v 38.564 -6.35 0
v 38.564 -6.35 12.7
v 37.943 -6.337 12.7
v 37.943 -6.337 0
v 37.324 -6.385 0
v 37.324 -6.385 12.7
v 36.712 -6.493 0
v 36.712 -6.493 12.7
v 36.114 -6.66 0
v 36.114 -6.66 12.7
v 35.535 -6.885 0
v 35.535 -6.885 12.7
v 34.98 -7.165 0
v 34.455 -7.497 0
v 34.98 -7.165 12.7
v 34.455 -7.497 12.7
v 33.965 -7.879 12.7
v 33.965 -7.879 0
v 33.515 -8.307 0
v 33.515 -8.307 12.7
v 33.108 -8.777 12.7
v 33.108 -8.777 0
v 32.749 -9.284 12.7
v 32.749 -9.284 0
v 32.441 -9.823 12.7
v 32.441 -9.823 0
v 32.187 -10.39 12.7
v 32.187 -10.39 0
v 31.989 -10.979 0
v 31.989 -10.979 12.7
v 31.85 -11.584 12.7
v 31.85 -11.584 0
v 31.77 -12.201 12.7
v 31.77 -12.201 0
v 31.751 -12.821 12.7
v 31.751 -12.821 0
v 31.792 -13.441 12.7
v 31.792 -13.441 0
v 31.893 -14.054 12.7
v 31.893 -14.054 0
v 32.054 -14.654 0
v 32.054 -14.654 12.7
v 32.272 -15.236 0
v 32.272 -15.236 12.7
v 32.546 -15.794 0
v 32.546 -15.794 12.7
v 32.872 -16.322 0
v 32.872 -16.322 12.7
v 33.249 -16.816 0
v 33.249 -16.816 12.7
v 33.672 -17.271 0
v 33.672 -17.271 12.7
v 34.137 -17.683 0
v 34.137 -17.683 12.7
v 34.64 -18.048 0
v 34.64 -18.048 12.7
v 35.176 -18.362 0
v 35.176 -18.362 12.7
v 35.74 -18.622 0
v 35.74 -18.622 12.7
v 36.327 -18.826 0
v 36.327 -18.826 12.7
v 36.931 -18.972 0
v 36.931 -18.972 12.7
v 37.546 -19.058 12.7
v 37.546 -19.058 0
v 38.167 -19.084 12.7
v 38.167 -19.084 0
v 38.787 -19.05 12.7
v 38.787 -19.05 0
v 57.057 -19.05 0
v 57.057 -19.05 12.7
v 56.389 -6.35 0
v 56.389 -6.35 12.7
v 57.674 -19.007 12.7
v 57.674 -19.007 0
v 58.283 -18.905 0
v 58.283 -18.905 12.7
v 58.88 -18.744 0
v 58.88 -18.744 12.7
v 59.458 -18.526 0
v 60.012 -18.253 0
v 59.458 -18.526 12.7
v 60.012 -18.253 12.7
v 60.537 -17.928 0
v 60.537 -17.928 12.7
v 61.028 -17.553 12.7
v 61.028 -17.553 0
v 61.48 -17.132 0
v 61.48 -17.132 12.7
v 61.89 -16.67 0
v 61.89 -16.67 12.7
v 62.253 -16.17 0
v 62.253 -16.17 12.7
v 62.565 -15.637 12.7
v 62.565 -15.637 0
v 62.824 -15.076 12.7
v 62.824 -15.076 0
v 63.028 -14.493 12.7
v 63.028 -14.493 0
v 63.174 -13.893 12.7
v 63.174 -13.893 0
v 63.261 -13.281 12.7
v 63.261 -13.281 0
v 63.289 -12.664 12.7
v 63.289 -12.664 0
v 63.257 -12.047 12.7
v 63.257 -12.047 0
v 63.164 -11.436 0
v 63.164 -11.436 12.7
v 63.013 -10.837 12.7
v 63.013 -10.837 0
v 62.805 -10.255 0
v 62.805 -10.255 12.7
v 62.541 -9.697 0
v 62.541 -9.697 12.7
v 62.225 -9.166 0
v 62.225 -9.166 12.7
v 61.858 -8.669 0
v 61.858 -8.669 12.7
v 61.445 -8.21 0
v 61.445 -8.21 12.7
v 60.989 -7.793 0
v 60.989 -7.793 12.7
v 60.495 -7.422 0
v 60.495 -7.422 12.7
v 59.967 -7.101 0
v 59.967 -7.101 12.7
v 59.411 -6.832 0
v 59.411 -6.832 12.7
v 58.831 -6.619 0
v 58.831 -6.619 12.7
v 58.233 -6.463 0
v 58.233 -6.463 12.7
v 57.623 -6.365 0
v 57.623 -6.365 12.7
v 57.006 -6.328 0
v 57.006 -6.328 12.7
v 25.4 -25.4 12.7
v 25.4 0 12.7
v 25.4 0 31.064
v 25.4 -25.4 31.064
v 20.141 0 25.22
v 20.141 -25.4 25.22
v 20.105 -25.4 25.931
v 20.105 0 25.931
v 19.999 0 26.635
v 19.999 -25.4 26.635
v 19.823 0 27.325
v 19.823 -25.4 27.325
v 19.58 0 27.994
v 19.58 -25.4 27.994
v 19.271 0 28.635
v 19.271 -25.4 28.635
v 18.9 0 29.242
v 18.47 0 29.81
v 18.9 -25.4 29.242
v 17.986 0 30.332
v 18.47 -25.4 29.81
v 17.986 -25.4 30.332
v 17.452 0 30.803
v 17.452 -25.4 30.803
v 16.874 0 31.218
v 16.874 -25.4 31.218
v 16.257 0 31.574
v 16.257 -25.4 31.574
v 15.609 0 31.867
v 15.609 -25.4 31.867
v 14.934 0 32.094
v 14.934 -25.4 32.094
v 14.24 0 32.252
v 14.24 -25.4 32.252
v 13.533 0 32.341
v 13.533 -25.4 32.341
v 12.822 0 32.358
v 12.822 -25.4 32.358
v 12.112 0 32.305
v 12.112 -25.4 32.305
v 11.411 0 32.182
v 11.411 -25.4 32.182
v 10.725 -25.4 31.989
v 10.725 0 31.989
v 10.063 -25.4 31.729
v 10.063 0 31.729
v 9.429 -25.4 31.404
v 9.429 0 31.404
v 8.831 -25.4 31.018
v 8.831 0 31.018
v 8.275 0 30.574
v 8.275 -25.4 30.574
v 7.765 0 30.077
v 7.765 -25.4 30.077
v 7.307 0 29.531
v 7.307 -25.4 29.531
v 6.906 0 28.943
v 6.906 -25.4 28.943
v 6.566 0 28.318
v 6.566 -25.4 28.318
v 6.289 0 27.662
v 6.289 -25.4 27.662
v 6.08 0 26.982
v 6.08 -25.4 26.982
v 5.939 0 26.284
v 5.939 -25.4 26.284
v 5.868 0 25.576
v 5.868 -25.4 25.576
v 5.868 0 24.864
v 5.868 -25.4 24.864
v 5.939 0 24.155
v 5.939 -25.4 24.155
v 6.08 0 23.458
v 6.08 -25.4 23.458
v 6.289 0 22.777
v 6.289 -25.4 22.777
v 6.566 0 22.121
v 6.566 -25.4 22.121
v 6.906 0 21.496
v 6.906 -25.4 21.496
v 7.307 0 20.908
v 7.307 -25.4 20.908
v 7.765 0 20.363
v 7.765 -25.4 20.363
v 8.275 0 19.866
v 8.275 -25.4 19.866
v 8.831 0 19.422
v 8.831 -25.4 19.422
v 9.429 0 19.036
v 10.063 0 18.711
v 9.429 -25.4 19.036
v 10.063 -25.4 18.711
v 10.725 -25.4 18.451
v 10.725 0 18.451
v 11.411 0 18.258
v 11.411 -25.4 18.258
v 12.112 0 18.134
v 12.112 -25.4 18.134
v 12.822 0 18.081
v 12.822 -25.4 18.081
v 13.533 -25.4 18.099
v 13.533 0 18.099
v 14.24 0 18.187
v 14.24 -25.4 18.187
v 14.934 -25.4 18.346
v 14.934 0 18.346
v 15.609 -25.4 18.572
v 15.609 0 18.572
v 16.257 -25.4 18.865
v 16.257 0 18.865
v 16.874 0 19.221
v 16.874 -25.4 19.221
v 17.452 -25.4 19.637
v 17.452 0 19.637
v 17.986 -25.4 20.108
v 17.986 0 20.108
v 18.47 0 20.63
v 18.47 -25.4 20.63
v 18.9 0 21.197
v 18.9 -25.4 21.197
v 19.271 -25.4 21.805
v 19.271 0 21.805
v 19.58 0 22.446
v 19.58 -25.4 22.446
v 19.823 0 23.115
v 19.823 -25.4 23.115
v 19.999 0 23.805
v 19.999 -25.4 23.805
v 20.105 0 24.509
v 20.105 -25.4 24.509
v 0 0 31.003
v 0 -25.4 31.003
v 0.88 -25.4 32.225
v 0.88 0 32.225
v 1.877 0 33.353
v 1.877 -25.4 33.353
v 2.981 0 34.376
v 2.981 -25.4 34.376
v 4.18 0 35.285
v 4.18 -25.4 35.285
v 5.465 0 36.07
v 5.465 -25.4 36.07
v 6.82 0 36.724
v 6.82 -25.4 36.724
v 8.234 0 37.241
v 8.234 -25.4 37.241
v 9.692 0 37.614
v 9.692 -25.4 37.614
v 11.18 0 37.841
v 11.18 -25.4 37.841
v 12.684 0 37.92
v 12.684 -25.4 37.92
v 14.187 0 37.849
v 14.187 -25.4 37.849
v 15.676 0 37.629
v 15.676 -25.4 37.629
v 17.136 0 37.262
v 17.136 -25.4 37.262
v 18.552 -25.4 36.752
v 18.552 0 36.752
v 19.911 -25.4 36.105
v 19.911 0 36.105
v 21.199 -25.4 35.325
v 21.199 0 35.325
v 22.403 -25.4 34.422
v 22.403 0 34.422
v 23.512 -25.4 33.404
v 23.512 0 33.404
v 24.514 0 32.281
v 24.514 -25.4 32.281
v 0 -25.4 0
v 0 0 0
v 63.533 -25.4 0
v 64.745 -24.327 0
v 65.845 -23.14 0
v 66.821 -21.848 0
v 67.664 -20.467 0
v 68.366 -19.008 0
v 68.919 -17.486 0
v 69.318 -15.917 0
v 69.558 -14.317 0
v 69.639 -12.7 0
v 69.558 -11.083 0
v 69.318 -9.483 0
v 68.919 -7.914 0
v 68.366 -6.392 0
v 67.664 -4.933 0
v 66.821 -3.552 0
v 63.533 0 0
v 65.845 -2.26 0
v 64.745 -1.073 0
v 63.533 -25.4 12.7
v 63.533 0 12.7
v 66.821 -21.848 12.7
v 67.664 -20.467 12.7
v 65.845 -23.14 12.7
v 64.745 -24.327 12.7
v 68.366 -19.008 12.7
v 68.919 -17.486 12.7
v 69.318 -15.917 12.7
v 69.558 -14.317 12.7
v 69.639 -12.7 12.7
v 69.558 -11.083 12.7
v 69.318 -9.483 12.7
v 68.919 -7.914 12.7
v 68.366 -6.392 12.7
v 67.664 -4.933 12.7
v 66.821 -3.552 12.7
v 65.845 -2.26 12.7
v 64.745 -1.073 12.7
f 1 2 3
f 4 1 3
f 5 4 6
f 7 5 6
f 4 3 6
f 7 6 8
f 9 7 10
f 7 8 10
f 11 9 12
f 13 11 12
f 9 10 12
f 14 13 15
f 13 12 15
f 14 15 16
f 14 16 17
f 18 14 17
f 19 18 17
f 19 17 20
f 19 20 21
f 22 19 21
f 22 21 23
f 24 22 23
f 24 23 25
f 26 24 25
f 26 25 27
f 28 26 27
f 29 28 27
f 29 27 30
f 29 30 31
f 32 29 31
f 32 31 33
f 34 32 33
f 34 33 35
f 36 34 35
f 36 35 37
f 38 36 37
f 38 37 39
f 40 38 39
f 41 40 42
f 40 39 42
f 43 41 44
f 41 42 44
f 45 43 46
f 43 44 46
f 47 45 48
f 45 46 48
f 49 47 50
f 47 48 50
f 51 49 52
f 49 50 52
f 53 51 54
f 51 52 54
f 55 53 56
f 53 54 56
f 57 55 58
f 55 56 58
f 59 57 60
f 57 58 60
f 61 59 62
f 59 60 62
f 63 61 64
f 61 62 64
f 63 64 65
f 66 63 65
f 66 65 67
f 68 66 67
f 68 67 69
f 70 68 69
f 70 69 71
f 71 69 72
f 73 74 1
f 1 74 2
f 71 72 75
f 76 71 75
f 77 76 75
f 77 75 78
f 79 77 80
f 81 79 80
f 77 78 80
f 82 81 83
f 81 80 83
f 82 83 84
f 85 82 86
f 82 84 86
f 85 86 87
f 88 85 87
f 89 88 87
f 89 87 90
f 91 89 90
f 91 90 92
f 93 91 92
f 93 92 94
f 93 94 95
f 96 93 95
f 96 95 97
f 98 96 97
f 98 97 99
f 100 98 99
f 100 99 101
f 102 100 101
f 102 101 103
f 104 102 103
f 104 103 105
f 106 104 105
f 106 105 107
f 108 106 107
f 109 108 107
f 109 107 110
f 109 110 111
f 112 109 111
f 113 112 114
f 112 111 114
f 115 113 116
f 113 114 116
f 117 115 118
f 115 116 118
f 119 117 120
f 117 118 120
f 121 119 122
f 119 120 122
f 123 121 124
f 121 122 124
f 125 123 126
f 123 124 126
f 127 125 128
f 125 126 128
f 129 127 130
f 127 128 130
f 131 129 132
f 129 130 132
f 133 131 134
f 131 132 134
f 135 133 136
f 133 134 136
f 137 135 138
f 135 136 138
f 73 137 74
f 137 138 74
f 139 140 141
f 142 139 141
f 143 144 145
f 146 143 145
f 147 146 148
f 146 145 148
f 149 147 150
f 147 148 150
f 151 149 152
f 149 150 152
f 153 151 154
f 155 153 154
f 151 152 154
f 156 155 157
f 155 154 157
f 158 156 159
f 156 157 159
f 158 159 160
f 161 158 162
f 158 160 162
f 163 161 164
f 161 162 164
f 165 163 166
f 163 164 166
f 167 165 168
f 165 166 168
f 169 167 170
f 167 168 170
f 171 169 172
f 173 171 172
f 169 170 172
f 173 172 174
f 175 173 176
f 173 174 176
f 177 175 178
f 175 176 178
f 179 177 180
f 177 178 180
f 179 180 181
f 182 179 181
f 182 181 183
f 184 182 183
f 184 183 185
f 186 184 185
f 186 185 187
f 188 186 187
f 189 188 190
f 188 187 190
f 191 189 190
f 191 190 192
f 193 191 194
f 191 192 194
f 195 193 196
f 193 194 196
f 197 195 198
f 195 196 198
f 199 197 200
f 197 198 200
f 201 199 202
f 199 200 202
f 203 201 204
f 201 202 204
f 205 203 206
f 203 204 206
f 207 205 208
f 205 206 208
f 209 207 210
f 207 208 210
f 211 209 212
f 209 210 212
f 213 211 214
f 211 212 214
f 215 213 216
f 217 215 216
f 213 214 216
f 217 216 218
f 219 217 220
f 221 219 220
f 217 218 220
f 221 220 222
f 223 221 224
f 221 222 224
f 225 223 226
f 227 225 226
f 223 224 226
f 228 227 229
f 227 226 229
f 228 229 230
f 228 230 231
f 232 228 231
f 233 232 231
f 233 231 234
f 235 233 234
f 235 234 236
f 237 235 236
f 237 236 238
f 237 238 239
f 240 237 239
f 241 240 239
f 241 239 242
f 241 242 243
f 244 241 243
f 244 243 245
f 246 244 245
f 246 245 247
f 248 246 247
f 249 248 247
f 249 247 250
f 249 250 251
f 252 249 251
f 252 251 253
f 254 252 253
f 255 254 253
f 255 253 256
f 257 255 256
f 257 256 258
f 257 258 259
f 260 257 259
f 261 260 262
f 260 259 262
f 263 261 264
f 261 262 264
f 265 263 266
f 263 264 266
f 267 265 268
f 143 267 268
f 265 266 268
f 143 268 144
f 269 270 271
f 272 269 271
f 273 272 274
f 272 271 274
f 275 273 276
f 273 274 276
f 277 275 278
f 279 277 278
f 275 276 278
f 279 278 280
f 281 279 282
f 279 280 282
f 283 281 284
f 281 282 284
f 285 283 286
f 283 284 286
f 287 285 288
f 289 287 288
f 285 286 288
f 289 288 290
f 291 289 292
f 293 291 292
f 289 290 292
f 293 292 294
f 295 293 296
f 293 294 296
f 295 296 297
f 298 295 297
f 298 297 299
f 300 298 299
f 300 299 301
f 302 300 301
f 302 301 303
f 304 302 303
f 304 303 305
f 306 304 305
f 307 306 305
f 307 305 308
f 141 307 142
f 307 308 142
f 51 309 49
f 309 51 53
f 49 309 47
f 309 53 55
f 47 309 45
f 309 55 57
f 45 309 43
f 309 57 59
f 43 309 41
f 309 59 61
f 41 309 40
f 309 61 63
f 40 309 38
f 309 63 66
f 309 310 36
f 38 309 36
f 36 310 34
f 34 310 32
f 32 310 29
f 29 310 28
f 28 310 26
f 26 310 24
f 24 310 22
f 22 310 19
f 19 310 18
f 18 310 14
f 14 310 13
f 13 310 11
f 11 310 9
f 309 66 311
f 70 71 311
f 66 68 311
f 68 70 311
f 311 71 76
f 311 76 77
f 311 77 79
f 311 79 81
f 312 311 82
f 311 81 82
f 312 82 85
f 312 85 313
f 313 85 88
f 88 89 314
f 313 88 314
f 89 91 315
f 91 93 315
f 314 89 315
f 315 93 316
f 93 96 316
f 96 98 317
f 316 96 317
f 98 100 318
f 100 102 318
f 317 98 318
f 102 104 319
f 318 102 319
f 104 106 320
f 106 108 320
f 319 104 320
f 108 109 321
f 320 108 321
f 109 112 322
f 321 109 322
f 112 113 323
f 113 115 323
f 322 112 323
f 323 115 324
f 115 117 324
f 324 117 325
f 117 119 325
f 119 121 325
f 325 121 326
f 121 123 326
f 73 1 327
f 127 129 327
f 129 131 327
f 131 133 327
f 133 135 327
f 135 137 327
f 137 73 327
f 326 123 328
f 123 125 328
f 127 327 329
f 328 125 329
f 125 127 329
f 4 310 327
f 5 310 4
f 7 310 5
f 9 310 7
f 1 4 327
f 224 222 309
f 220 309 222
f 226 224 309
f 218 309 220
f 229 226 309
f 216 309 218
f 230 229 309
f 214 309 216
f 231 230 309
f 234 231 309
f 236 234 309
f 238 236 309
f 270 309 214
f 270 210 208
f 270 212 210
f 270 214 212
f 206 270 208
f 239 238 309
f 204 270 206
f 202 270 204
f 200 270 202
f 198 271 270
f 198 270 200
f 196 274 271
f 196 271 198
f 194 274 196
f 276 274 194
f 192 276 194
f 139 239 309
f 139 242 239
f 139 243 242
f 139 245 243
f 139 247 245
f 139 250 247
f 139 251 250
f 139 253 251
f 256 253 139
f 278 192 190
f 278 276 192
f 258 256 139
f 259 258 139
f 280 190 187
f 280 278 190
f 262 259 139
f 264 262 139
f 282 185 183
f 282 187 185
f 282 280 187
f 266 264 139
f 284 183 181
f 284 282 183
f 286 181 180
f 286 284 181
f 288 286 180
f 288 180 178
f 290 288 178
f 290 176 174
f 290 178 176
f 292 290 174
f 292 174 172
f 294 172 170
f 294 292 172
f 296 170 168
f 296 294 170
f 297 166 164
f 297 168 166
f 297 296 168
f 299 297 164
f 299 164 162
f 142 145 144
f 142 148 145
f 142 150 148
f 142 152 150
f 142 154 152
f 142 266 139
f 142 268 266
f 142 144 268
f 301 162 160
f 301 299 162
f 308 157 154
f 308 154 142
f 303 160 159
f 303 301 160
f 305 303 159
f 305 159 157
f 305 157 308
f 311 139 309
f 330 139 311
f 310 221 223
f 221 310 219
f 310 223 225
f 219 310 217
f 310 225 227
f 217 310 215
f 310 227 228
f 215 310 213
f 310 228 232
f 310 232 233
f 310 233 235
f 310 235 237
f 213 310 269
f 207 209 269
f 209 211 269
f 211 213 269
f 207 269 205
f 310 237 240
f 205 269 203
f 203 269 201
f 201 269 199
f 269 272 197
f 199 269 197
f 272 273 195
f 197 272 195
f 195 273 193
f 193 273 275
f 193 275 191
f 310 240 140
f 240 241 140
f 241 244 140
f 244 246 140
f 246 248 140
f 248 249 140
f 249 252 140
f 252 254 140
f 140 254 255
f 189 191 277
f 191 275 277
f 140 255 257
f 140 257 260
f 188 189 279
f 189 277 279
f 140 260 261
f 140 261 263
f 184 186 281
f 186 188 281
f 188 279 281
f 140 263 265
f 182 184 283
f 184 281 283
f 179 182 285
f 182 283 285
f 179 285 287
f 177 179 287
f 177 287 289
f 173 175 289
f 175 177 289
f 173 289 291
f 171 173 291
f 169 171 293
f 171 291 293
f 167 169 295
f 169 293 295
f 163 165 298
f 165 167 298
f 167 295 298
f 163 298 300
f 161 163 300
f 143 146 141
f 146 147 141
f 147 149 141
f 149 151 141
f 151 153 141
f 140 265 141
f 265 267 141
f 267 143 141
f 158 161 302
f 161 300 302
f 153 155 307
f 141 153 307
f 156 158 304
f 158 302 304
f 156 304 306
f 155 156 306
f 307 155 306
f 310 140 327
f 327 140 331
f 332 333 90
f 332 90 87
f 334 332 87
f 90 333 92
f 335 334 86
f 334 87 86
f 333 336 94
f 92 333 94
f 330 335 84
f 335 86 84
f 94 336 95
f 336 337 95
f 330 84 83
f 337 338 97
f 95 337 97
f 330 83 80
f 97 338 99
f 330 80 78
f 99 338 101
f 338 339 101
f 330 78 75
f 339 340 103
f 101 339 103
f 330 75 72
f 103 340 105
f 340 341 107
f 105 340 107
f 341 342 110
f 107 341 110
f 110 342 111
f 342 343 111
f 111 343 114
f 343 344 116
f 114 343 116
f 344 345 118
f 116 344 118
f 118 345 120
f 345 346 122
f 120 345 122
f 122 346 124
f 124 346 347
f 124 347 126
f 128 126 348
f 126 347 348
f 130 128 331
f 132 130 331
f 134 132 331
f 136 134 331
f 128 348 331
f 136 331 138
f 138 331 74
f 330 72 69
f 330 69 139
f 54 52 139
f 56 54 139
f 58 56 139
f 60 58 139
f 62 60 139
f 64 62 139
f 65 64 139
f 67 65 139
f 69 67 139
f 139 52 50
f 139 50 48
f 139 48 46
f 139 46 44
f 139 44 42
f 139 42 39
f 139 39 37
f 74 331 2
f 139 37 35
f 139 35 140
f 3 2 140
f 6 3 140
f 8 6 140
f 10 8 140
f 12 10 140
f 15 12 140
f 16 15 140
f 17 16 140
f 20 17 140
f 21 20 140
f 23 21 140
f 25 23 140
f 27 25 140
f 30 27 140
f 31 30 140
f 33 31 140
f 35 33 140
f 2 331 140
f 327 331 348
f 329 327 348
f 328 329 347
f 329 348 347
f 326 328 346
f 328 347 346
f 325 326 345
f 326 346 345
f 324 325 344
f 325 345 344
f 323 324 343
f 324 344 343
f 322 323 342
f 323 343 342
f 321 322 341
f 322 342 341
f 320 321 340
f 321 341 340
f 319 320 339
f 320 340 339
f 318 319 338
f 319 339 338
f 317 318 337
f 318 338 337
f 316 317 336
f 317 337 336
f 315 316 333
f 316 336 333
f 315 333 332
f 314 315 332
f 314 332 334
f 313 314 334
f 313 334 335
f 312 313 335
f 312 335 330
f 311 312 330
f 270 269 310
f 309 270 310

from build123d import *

# Parameters (mm, degrees)
F1_DEPTH = 25.4
F3_DEPTH = 25.4
F5_DEPTH = 25.4
F6_R     = 7.14088
F7_DEPTH = 25.4
F9_DEPTH = 25.4


with BuildPart() as f1:
    # F0 (on Front) → F1 (new body)
    with BuildSketch(Plane.XZ):
        Polygon((25.4, 38.1), (0, 38.1), (0, 0), (69.85, 0), (69.85, 12.7), (25.4, 12.7), align=None)
    extrude(amount=F1_DEPTH)

    # F2 (on face) → F3 (cut)
    with BuildSketch(Plane.XZ.offset(25.4)):
        with BuildLine():
            ThreePointArc((0, 31.003495), (12.683588, 37.919742), (25.4, 31.064033))
            Line((25.4, 31.064033), (25.4, 38.1))
            Line((25.4, 38.1), (0, 38.1))
            Line((0, 38.1), (0, 31.003495))
        make_face()
    extrude(amount=-F3_DEPTH, mode=Mode.SUBTRACT)

    # F4 (on face) → F5 (cut)
    with BuildSketch(Plane.XY.offset(12.7)):
        with BuildLine():
            ThreePointArc((63.532993, 0), (69.639018, -12.7), (63.532993, -25.4))
            Line((63.532993, -25.4), (69.85, -25.4))
            Line((69.85, -25.4), (69.85, 0))
            Line((69.85, 0), (63.532993, 0))
        make_face()
    extrude(amount=-F5_DEPTH, mode=Mode.SUBTRACT)

    # F6 (on face) → F7 (cut)
    with BuildSketch(Plane.XZ.offset(25.4)):
        with Locations((12.999689, 25.219742)):
            Circle(F6_R)
    extrude(amount=-F7_DEPTH, mode=Mode.SUBTRACT)

    # F8 (on face) → F9 (cut)
    with BuildSketch(Plane.XY.offset(12.7)):
        with BuildLine():
            Line((56.389028, -6.35), (38.564463, -6.35))
            ThreePointArc((38.564463, -6.35), (31.750977, -12.821492), (38.787275, -19.05))
            Line((38.787275, -19.05), (57.057447, -19.05))
            ThreePointArc((57.057447, -19.05), (63.280229, -12.354896), (56.389028, -6.35))
        make_face()
    extrude(amount=-F9_DEPTH, mode=Mode.SUBTRACT)


solid = f1.part
